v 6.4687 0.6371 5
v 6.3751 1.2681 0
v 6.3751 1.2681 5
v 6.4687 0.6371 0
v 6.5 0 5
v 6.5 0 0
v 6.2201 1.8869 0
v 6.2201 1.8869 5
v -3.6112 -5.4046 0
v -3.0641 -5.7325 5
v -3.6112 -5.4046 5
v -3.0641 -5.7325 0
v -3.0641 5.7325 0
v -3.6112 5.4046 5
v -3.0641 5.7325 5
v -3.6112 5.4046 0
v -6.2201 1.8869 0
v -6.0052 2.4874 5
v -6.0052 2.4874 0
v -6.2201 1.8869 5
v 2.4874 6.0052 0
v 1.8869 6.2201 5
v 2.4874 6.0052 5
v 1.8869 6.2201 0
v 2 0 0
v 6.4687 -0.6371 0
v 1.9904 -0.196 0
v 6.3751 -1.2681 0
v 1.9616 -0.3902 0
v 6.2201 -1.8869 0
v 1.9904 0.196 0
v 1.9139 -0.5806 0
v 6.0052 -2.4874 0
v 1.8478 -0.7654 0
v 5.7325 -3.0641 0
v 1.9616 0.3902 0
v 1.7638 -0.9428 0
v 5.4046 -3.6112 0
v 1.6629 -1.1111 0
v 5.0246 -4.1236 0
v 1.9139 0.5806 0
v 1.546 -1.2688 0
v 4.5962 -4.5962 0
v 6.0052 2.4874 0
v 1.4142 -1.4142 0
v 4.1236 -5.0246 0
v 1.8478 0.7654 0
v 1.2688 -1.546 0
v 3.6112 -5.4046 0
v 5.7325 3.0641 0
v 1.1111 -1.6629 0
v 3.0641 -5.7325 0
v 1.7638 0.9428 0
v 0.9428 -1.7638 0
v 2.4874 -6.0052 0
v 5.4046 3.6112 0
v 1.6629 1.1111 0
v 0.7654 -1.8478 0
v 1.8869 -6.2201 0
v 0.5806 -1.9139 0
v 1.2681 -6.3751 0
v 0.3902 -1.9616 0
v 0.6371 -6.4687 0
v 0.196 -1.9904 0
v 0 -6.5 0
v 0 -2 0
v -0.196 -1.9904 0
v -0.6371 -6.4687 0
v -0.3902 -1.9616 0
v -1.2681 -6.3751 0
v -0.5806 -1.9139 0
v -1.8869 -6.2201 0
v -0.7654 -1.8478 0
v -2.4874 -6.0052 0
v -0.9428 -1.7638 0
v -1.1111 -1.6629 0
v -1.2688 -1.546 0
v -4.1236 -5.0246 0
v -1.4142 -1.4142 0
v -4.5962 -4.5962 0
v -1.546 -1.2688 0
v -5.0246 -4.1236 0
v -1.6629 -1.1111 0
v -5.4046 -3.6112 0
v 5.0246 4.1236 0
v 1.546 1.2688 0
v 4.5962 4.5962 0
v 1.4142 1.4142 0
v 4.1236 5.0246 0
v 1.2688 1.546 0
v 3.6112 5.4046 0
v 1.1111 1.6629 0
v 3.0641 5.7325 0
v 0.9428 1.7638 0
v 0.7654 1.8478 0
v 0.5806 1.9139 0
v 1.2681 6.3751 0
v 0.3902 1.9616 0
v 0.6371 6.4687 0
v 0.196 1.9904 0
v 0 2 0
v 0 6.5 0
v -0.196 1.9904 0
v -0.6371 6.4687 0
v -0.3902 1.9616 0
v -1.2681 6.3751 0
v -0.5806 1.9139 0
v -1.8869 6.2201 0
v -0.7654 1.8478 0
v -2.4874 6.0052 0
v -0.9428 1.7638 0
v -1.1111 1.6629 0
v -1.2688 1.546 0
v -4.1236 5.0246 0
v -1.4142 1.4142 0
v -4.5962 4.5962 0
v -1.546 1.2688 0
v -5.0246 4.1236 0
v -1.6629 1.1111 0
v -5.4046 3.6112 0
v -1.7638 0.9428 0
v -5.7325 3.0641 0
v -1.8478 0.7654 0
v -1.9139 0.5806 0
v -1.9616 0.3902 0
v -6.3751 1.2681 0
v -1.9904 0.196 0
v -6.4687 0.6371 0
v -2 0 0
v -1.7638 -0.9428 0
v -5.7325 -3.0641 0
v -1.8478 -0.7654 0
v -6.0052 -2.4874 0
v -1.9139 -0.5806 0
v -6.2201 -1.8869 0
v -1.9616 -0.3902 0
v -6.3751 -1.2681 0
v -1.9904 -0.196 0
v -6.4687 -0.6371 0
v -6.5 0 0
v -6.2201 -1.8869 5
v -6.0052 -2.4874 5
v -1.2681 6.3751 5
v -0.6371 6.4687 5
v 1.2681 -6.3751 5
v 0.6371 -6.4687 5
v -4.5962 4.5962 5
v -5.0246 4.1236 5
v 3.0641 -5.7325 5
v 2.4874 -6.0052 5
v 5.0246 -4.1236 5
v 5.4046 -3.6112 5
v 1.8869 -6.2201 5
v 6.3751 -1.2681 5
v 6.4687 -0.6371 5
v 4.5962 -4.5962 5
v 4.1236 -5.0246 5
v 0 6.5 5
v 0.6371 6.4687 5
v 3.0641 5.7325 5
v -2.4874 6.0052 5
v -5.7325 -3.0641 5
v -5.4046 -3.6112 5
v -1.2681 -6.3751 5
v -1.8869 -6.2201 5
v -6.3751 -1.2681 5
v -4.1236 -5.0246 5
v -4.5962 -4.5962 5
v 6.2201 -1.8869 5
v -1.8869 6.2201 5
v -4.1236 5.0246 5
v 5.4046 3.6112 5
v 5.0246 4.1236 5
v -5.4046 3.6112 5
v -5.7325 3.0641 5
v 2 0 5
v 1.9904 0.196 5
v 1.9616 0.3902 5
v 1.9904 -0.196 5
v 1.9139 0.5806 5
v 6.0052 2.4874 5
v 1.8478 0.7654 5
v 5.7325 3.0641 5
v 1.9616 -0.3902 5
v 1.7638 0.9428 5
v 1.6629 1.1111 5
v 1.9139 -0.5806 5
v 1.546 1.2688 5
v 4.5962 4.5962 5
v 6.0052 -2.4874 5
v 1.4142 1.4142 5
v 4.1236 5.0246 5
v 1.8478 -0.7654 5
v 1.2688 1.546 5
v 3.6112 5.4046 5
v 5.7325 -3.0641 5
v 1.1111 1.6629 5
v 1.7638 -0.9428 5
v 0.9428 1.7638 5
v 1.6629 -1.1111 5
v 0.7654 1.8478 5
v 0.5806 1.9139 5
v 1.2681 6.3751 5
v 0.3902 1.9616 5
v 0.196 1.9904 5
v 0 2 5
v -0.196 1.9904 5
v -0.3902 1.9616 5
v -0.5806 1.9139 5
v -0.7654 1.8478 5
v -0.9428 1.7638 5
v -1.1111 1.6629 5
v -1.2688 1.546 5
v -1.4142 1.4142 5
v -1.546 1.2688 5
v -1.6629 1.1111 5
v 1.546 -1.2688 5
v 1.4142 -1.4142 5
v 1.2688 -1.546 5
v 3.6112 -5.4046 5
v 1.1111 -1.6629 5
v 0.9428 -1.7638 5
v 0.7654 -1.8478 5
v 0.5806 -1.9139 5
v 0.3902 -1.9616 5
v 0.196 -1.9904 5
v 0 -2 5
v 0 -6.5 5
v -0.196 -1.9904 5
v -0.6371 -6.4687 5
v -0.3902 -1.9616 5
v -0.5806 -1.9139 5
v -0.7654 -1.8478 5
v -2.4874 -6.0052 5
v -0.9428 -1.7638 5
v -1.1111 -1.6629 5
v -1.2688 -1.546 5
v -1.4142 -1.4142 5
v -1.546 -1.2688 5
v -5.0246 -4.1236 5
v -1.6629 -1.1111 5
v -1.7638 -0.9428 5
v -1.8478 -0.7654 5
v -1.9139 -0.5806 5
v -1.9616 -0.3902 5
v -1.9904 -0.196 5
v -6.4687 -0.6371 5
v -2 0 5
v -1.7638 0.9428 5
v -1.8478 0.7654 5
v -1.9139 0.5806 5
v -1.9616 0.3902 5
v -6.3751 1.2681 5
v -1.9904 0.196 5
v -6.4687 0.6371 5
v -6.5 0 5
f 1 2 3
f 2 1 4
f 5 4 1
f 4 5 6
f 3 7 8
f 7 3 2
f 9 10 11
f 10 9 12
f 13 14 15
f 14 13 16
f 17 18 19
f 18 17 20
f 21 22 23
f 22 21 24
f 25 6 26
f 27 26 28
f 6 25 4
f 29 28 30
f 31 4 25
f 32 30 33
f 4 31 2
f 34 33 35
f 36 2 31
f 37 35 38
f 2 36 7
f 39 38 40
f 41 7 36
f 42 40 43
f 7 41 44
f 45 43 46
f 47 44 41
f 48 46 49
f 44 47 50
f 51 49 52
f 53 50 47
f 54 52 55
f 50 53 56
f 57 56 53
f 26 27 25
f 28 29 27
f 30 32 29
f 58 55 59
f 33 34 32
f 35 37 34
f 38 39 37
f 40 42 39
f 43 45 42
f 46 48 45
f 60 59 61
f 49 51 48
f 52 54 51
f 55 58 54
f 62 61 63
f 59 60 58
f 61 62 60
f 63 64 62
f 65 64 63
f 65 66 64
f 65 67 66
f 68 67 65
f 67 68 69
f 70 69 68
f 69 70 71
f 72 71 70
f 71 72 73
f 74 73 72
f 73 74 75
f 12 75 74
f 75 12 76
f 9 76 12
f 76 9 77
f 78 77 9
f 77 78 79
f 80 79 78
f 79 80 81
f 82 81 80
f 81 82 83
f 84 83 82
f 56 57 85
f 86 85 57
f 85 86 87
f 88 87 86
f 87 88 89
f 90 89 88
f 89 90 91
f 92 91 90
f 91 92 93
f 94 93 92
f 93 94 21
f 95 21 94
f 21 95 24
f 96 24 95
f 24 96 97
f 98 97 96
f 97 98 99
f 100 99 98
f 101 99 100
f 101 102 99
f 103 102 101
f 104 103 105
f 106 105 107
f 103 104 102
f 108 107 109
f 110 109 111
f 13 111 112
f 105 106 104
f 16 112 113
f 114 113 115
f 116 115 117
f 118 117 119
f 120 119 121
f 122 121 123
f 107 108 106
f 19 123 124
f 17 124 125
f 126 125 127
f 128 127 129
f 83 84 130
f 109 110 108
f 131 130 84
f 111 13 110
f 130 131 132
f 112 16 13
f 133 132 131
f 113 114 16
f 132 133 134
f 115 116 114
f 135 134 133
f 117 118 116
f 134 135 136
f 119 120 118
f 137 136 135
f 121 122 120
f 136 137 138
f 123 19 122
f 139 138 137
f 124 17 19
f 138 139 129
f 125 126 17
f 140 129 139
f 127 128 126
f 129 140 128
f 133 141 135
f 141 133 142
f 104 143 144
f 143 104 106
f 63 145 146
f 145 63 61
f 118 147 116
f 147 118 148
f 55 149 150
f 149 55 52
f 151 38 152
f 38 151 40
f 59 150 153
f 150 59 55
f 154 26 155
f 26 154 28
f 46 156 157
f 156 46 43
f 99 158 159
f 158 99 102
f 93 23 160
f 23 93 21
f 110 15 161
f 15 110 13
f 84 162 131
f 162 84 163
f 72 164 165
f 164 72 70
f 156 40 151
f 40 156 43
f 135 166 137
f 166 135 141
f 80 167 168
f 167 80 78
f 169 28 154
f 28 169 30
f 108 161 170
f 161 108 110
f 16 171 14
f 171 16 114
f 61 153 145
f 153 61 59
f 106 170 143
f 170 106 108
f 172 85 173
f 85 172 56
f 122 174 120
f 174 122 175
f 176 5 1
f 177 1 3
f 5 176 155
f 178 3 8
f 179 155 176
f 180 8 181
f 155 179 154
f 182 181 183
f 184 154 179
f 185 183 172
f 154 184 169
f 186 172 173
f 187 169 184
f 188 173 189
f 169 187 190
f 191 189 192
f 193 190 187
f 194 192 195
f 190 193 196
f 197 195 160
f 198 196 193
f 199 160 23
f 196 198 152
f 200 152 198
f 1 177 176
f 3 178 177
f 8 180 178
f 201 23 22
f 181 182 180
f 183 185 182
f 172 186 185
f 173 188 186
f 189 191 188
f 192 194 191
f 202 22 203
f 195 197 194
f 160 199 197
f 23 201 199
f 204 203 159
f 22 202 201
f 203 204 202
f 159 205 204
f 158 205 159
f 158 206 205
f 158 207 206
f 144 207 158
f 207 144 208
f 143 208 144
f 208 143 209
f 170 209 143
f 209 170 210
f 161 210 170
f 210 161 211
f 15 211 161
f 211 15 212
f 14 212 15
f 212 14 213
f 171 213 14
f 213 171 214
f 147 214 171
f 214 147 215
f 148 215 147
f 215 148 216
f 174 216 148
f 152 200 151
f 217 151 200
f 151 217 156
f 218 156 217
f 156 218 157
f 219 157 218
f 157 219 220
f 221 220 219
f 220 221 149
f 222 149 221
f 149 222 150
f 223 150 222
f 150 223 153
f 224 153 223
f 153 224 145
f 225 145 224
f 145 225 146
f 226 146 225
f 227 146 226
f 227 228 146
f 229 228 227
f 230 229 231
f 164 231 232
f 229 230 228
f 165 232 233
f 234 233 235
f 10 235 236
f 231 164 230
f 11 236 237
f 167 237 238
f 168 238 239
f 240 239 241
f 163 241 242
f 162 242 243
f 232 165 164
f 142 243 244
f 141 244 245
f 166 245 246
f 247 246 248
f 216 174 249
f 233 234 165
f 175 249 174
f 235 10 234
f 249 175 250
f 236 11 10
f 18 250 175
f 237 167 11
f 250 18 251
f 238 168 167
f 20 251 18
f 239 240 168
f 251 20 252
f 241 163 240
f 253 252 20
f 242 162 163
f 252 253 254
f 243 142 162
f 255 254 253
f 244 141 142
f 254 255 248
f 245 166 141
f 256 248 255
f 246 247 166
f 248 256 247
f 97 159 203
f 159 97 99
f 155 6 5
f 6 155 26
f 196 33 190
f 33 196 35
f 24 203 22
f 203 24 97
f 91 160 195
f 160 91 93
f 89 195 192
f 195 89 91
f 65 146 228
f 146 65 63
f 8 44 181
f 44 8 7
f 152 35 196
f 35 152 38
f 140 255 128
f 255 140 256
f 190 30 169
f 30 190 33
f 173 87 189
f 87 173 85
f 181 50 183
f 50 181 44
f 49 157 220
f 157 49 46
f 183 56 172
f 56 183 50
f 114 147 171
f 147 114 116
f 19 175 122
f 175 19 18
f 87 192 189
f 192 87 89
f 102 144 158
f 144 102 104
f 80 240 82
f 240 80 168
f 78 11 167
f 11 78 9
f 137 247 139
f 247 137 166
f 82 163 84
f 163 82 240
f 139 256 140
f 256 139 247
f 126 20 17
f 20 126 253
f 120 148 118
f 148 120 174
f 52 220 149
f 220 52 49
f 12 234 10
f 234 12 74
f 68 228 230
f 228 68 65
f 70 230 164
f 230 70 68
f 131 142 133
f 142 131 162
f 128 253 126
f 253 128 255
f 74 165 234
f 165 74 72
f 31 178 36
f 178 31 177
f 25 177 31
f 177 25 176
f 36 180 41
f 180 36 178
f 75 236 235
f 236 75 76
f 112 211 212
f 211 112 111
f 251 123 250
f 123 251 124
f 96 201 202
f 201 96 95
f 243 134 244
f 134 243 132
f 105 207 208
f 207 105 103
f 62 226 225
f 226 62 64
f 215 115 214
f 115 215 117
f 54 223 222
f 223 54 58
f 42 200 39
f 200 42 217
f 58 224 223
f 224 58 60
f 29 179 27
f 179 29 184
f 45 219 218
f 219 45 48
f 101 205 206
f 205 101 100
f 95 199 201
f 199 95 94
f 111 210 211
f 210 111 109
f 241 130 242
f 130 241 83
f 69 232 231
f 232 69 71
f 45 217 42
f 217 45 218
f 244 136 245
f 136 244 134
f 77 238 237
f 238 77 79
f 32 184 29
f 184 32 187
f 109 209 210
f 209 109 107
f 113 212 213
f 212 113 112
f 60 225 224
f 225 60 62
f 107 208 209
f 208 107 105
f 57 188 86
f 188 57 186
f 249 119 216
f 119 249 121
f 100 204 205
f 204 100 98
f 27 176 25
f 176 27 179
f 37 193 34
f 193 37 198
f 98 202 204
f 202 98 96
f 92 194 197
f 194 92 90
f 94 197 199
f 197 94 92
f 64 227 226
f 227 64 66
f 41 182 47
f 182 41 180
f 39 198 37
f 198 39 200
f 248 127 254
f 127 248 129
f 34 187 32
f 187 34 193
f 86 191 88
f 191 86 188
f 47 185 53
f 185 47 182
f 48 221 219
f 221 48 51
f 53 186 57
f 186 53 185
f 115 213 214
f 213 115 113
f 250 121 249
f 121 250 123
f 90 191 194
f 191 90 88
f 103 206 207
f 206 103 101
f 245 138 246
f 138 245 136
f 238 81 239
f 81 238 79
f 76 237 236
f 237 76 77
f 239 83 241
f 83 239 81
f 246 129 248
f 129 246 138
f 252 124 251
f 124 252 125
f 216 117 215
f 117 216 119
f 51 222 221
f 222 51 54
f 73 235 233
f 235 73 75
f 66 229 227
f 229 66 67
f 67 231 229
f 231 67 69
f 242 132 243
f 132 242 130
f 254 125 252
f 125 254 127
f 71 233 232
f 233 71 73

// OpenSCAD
module ball_bearing() {
    difference() {
        // Outer cylinder
        cylinder(d=13.0, h=5.0, $fn=64);
        
        // Inner bore
        translate([0, 0, -1])
            cylinder(d=4.0, h=7.0, $fn=64);
    }
}

ball_bearing();
